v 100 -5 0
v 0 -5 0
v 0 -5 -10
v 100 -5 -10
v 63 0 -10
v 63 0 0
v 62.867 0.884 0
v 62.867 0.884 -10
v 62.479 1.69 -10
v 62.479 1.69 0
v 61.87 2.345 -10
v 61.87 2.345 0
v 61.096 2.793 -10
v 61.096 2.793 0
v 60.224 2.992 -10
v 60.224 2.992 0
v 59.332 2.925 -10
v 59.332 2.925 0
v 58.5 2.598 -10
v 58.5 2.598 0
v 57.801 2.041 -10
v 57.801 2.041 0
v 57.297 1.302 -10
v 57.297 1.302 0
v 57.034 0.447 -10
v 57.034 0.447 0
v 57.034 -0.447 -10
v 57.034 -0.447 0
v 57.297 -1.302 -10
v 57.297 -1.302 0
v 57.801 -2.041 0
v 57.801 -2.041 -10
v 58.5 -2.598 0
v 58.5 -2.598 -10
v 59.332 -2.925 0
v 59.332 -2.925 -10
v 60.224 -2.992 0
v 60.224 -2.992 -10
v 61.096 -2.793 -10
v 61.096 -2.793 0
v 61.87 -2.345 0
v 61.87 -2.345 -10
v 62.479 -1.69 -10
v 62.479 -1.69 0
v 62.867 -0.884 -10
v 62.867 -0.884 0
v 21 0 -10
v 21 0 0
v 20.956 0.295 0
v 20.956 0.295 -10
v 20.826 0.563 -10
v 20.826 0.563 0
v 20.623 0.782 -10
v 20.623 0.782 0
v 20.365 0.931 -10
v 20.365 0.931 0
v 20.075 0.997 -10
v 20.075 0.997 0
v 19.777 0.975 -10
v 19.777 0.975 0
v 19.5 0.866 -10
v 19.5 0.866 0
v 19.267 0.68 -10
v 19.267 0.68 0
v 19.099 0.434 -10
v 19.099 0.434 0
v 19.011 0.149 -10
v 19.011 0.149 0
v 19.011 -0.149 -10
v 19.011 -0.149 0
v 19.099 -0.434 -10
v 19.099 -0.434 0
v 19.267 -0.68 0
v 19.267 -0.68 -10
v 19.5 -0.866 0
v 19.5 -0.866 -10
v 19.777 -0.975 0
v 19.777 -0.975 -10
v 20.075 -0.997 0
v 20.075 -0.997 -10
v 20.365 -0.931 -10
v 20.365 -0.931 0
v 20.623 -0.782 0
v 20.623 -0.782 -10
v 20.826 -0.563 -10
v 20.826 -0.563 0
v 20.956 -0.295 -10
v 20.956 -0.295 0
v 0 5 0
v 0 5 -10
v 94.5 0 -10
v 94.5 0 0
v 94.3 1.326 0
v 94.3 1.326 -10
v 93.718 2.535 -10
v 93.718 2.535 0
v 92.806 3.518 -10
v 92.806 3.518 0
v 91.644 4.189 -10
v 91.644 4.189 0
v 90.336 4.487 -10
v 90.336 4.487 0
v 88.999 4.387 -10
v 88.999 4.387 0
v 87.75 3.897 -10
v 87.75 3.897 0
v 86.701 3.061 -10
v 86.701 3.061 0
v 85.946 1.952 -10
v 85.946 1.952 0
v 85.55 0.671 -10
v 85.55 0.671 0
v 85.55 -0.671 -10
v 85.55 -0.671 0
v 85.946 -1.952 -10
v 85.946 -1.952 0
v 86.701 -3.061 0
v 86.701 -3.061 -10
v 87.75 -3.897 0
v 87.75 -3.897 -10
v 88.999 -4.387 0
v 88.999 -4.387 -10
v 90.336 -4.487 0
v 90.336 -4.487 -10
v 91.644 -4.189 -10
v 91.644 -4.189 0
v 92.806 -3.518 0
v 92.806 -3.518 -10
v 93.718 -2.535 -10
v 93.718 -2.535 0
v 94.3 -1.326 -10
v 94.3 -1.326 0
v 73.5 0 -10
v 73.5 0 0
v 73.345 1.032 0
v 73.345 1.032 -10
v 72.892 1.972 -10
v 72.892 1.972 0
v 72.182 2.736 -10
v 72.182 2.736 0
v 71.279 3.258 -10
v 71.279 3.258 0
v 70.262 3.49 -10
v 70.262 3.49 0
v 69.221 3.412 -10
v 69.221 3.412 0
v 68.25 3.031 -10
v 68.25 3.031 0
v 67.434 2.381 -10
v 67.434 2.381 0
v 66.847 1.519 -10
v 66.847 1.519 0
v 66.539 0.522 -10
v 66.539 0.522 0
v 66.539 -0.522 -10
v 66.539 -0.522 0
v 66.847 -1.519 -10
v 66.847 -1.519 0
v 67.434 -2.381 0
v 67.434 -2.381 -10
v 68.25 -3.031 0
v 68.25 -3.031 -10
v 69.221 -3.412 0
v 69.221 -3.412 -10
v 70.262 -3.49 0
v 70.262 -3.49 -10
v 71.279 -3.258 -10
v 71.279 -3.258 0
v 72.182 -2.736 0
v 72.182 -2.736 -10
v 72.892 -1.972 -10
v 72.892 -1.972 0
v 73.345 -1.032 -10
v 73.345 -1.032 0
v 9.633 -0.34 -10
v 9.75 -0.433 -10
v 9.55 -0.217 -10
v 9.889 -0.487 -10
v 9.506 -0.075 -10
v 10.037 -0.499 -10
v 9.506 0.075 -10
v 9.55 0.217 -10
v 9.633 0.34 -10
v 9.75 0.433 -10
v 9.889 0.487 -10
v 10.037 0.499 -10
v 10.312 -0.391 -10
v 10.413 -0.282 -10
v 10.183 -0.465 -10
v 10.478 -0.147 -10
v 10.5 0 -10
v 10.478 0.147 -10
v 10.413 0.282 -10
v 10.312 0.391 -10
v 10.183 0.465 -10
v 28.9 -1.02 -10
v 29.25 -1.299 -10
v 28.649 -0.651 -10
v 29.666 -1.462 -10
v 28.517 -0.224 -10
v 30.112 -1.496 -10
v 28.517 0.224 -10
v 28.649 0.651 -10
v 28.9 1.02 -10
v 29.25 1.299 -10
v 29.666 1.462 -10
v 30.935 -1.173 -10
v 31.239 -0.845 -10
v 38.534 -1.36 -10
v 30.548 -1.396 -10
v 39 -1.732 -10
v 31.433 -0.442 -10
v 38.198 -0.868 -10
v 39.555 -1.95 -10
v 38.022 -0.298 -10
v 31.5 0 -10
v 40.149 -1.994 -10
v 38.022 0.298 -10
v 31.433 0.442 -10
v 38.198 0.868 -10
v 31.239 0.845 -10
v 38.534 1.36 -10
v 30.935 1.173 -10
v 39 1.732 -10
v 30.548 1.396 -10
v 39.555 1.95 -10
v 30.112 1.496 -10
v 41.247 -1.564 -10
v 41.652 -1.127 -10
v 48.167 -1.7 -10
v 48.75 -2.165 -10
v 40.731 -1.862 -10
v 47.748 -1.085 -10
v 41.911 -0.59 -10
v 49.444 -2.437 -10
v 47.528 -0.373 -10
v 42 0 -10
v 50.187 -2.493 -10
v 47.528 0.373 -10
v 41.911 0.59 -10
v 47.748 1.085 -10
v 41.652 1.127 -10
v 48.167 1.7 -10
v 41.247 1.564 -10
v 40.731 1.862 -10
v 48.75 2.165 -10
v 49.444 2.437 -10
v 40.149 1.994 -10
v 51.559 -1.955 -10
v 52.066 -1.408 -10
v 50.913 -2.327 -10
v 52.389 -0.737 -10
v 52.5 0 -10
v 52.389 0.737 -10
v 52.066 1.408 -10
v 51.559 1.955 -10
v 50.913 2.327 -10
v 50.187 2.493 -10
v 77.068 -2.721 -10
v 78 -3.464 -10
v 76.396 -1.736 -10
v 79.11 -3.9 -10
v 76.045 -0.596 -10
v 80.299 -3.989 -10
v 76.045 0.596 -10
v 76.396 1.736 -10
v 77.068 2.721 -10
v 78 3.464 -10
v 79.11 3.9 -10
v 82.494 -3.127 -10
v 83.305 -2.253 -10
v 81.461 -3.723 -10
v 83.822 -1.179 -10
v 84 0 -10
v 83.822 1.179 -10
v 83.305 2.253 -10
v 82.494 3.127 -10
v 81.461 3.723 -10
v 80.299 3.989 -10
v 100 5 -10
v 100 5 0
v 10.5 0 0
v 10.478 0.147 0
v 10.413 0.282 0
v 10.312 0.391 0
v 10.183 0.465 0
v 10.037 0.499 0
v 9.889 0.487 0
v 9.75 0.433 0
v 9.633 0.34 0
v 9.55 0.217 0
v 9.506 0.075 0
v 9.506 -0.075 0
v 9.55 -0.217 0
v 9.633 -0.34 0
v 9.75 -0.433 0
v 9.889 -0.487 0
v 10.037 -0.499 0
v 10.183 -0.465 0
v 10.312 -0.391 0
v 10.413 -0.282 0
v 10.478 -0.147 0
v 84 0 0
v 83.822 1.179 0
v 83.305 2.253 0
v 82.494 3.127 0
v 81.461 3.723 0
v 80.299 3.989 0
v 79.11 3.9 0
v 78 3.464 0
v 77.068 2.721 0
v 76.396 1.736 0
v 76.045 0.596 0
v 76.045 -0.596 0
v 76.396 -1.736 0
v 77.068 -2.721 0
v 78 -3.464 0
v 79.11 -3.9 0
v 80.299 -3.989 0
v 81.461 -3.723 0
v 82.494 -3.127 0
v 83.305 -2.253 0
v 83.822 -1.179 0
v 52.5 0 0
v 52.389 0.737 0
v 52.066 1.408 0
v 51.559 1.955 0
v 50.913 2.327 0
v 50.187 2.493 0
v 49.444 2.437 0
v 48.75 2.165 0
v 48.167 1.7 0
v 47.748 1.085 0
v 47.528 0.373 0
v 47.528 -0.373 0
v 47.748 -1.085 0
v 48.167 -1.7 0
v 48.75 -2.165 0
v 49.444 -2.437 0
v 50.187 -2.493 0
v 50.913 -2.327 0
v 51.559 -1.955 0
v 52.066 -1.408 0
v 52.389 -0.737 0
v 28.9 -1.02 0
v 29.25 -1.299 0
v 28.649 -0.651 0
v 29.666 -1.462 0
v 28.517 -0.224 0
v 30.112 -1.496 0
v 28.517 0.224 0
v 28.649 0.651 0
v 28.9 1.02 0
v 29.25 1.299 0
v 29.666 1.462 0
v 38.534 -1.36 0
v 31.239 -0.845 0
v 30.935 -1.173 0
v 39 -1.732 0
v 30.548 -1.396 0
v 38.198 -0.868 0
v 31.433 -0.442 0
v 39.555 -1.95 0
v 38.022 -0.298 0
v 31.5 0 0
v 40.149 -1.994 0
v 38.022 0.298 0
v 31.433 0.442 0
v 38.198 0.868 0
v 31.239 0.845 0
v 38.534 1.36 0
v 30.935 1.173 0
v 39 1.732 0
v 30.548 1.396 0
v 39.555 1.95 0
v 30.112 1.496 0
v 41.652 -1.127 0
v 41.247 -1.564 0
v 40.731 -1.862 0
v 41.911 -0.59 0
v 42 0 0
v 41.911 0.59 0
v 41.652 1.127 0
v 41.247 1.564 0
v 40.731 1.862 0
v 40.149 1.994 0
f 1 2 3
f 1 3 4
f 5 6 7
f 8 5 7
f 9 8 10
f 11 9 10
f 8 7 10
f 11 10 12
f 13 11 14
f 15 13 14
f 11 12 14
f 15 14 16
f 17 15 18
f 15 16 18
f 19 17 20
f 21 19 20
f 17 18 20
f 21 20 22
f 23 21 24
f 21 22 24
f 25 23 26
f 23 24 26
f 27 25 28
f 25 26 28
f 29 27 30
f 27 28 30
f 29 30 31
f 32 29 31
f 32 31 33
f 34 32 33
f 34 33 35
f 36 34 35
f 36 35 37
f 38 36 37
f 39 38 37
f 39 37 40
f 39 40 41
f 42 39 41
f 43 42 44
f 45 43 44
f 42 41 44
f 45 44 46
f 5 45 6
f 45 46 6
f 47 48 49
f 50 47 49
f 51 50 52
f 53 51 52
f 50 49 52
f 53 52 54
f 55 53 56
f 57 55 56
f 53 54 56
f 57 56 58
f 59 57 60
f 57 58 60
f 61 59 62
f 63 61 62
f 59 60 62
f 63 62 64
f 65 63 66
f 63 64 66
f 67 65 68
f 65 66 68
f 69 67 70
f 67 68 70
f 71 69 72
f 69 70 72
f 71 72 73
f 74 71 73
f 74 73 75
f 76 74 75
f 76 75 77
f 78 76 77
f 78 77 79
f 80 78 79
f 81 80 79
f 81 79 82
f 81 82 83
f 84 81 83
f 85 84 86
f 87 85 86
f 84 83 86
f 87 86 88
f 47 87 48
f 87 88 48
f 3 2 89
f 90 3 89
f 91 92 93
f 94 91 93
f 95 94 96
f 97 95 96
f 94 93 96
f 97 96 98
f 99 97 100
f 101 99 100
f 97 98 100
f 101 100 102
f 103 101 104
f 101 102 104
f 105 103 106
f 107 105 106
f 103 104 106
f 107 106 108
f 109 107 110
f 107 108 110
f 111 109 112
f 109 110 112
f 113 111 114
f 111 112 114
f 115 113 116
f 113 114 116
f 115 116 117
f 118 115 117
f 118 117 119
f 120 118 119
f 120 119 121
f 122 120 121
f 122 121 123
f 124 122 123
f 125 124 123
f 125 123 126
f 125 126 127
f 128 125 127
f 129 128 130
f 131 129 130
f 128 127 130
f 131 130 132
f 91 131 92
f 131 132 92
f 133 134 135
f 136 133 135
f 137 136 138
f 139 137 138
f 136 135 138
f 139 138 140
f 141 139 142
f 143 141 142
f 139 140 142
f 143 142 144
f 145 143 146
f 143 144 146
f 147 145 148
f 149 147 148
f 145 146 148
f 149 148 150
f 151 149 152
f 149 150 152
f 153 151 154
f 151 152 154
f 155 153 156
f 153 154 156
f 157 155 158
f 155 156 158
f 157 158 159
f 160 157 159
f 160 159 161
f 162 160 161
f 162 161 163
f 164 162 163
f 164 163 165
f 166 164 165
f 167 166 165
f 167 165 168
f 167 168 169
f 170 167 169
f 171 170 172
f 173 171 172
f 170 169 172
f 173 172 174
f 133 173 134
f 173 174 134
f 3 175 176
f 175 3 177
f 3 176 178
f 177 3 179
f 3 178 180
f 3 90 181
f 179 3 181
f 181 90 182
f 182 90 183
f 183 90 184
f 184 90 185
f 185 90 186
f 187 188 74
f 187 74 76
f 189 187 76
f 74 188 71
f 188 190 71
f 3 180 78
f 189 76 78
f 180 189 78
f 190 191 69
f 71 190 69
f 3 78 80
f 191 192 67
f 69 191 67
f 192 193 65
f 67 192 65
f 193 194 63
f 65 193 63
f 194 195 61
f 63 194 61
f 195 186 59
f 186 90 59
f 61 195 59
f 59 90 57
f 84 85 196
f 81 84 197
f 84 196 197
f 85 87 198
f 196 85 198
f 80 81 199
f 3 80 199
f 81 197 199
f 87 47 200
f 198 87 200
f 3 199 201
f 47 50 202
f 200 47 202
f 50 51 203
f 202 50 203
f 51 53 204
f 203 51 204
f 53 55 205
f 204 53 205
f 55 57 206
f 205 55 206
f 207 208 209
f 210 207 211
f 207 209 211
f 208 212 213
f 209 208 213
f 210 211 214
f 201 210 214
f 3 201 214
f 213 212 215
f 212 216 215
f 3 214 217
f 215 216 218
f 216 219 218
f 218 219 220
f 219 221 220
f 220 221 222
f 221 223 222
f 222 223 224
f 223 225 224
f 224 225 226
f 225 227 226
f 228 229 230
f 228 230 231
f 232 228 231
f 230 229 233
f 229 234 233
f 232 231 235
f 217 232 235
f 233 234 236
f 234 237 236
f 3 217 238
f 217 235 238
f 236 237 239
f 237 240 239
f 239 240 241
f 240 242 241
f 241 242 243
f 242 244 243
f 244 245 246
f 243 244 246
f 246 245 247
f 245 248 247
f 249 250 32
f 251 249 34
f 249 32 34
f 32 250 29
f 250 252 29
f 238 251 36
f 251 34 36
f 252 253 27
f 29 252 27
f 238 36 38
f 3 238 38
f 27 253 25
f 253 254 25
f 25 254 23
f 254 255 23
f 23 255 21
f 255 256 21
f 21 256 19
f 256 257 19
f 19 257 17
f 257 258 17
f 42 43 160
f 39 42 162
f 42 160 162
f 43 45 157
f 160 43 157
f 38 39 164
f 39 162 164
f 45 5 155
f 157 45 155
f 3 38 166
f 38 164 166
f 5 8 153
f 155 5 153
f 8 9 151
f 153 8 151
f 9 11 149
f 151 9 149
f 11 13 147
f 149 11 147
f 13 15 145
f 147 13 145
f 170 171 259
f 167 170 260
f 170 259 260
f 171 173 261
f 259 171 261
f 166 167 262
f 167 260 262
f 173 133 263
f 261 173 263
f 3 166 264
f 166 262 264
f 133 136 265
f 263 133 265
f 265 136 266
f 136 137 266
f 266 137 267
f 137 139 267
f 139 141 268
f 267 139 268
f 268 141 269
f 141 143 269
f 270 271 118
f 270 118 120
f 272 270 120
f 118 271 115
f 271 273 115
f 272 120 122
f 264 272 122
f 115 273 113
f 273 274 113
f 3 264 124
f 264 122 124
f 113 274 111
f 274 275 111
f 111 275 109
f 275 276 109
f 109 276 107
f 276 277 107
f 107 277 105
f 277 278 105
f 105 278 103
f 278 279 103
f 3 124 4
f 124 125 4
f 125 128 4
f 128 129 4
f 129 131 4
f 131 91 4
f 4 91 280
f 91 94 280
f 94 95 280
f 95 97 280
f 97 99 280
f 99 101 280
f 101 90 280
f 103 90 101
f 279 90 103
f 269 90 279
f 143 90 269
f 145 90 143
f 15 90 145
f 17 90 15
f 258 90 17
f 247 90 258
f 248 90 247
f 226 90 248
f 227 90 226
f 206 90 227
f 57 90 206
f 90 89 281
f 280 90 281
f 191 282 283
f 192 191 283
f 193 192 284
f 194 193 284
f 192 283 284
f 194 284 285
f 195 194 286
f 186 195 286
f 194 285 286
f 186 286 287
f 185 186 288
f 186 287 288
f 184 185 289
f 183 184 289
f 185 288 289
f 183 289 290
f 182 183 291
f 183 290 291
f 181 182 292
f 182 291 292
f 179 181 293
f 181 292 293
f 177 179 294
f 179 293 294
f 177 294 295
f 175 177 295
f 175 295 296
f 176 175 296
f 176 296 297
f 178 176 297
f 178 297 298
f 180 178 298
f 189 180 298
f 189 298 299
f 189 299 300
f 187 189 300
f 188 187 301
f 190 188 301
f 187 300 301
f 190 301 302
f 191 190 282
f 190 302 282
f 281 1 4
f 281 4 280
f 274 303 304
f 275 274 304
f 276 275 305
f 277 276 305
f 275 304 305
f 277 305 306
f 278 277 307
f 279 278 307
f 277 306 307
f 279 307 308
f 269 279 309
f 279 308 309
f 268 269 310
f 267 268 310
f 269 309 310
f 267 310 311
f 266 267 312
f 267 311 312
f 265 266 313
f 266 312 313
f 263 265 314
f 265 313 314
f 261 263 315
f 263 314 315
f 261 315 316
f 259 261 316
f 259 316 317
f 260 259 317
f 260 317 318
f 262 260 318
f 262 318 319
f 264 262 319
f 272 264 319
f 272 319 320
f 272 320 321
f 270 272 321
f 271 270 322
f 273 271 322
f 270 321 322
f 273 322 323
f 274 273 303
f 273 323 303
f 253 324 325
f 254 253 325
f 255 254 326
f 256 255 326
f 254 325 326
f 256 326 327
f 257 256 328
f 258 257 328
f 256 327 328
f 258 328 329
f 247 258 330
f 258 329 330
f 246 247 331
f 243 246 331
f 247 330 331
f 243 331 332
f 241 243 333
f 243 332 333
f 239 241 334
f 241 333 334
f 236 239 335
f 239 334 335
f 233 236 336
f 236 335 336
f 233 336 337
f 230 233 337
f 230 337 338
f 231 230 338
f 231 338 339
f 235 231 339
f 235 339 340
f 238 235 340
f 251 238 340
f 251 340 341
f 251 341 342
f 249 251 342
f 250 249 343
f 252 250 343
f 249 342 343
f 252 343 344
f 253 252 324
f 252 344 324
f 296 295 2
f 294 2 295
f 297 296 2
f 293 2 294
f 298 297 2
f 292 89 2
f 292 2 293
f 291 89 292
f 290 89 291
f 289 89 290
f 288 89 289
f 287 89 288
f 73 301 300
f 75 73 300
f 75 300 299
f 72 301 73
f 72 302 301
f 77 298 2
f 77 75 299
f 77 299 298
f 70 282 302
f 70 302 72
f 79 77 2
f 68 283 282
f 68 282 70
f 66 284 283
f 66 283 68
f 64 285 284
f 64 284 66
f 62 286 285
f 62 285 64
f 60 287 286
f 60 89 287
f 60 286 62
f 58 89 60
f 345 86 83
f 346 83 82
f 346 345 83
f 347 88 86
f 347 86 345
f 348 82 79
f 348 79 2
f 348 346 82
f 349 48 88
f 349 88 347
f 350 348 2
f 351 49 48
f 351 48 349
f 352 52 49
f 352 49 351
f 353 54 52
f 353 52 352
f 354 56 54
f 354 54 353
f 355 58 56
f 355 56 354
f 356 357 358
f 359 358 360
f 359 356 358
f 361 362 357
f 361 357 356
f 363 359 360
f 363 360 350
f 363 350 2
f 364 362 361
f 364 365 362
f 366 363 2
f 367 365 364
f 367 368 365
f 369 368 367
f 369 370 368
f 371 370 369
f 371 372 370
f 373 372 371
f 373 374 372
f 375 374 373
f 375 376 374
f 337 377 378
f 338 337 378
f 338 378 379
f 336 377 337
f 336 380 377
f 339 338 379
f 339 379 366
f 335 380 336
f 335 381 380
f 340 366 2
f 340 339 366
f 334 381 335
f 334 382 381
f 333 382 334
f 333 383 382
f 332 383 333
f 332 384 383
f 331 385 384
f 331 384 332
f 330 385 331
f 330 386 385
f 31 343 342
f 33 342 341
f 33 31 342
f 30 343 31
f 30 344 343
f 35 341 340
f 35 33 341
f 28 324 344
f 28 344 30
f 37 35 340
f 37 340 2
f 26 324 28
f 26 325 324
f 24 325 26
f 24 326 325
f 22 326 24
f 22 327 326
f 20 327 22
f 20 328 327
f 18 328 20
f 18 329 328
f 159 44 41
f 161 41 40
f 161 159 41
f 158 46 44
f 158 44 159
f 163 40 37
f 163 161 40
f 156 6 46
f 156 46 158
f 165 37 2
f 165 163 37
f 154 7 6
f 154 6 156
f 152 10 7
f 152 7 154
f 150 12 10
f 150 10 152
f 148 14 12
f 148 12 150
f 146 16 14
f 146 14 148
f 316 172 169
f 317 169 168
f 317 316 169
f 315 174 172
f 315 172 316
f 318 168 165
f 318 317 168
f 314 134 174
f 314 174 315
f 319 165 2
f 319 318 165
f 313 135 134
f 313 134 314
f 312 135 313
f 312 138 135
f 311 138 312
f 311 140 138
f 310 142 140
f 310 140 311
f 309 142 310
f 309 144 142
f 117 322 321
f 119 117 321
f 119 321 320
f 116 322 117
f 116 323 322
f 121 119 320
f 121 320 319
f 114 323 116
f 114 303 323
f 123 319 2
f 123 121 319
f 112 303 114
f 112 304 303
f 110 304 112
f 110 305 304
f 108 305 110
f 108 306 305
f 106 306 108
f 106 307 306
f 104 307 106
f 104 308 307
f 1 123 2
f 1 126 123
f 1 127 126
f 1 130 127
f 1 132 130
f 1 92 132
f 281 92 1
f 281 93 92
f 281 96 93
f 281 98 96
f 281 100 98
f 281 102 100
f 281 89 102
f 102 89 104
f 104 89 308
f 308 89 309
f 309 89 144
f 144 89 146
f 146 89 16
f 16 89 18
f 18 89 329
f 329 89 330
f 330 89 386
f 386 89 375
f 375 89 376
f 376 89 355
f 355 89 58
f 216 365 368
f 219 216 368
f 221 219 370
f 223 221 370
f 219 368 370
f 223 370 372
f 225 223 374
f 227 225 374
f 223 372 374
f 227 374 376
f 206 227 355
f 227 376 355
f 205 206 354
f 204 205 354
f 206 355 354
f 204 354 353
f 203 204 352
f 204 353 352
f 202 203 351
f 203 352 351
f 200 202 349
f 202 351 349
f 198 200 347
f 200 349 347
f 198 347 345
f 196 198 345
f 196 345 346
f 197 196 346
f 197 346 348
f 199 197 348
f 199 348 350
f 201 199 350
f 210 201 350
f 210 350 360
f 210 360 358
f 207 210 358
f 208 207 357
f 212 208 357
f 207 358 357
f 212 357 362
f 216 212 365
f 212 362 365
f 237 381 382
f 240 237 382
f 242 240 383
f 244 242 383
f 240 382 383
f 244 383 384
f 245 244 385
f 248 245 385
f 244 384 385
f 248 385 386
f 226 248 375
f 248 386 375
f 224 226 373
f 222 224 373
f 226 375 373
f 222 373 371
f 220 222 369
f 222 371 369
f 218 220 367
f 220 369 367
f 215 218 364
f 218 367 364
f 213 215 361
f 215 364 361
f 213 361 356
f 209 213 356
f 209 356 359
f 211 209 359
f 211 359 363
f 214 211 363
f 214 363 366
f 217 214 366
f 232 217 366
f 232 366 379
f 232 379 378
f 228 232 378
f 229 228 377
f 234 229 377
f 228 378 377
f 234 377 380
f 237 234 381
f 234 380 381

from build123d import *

# Parameters (mm, degrees)
SKETCH_W   = 100
SKETCH_H   = 10
SKETCH_R   = 1
SKETCH_R_2 = 2
SKETCH_R_3 = 3
SKETCH_R_4 = 4
SKETCH_R_5 = 0.5
SKETCH_R_6 = 1.5
SKETCH_R_7 = 2.5
SKETCH_R_8 = 3.5
SKETCH_R_9 = 4.5
PAD_DEPTH  = 10


with BuildPart() as part:
    # Sketch → Pad (new body)
    with BuildSketch(Plane.XY):
        with Locations((50, 0)):
            Rectangle(SKETCH_W, SKETCH_H)
        with Locations((20, 0)):
            Circle(SKETCH_R, mode=Mode.SUBTRACT)
        with Locations((40, 0)):
            Circle(SKETCH_R_2, mode=Mode.SUBTRACT)
        with Locations((60, 0)):
            Circle(SKETCH_R_3, mode=Mode.SUBTRACT)
        with Locations((80, 0)):
            Circle(SKETCH_R_4, mode=Mode.SUBTRACT)
        with Locations((10, 0)):
            Circle(SKETCH_R_5, mode=Mode.SUBTRACT)
        with Locations((30, 0)):
            Circle(SKETCH_R_6, mode=Mode.SUBTRACT)
        with Locations((50, 0)):
            Circle(SKETCH_R_7, mode=Mode.SUBTRACT)
        with Locations((70, 0)):
            Circle(SKETCH_R_8, mode=Mode.SUBTRACT)
        with Locations((90, 0)):
            Circle(SKETCH_R_9, mode=Mode.SUBTRACT)
    extrude(amount=-PAD_DEPTH)


solid = part.part
